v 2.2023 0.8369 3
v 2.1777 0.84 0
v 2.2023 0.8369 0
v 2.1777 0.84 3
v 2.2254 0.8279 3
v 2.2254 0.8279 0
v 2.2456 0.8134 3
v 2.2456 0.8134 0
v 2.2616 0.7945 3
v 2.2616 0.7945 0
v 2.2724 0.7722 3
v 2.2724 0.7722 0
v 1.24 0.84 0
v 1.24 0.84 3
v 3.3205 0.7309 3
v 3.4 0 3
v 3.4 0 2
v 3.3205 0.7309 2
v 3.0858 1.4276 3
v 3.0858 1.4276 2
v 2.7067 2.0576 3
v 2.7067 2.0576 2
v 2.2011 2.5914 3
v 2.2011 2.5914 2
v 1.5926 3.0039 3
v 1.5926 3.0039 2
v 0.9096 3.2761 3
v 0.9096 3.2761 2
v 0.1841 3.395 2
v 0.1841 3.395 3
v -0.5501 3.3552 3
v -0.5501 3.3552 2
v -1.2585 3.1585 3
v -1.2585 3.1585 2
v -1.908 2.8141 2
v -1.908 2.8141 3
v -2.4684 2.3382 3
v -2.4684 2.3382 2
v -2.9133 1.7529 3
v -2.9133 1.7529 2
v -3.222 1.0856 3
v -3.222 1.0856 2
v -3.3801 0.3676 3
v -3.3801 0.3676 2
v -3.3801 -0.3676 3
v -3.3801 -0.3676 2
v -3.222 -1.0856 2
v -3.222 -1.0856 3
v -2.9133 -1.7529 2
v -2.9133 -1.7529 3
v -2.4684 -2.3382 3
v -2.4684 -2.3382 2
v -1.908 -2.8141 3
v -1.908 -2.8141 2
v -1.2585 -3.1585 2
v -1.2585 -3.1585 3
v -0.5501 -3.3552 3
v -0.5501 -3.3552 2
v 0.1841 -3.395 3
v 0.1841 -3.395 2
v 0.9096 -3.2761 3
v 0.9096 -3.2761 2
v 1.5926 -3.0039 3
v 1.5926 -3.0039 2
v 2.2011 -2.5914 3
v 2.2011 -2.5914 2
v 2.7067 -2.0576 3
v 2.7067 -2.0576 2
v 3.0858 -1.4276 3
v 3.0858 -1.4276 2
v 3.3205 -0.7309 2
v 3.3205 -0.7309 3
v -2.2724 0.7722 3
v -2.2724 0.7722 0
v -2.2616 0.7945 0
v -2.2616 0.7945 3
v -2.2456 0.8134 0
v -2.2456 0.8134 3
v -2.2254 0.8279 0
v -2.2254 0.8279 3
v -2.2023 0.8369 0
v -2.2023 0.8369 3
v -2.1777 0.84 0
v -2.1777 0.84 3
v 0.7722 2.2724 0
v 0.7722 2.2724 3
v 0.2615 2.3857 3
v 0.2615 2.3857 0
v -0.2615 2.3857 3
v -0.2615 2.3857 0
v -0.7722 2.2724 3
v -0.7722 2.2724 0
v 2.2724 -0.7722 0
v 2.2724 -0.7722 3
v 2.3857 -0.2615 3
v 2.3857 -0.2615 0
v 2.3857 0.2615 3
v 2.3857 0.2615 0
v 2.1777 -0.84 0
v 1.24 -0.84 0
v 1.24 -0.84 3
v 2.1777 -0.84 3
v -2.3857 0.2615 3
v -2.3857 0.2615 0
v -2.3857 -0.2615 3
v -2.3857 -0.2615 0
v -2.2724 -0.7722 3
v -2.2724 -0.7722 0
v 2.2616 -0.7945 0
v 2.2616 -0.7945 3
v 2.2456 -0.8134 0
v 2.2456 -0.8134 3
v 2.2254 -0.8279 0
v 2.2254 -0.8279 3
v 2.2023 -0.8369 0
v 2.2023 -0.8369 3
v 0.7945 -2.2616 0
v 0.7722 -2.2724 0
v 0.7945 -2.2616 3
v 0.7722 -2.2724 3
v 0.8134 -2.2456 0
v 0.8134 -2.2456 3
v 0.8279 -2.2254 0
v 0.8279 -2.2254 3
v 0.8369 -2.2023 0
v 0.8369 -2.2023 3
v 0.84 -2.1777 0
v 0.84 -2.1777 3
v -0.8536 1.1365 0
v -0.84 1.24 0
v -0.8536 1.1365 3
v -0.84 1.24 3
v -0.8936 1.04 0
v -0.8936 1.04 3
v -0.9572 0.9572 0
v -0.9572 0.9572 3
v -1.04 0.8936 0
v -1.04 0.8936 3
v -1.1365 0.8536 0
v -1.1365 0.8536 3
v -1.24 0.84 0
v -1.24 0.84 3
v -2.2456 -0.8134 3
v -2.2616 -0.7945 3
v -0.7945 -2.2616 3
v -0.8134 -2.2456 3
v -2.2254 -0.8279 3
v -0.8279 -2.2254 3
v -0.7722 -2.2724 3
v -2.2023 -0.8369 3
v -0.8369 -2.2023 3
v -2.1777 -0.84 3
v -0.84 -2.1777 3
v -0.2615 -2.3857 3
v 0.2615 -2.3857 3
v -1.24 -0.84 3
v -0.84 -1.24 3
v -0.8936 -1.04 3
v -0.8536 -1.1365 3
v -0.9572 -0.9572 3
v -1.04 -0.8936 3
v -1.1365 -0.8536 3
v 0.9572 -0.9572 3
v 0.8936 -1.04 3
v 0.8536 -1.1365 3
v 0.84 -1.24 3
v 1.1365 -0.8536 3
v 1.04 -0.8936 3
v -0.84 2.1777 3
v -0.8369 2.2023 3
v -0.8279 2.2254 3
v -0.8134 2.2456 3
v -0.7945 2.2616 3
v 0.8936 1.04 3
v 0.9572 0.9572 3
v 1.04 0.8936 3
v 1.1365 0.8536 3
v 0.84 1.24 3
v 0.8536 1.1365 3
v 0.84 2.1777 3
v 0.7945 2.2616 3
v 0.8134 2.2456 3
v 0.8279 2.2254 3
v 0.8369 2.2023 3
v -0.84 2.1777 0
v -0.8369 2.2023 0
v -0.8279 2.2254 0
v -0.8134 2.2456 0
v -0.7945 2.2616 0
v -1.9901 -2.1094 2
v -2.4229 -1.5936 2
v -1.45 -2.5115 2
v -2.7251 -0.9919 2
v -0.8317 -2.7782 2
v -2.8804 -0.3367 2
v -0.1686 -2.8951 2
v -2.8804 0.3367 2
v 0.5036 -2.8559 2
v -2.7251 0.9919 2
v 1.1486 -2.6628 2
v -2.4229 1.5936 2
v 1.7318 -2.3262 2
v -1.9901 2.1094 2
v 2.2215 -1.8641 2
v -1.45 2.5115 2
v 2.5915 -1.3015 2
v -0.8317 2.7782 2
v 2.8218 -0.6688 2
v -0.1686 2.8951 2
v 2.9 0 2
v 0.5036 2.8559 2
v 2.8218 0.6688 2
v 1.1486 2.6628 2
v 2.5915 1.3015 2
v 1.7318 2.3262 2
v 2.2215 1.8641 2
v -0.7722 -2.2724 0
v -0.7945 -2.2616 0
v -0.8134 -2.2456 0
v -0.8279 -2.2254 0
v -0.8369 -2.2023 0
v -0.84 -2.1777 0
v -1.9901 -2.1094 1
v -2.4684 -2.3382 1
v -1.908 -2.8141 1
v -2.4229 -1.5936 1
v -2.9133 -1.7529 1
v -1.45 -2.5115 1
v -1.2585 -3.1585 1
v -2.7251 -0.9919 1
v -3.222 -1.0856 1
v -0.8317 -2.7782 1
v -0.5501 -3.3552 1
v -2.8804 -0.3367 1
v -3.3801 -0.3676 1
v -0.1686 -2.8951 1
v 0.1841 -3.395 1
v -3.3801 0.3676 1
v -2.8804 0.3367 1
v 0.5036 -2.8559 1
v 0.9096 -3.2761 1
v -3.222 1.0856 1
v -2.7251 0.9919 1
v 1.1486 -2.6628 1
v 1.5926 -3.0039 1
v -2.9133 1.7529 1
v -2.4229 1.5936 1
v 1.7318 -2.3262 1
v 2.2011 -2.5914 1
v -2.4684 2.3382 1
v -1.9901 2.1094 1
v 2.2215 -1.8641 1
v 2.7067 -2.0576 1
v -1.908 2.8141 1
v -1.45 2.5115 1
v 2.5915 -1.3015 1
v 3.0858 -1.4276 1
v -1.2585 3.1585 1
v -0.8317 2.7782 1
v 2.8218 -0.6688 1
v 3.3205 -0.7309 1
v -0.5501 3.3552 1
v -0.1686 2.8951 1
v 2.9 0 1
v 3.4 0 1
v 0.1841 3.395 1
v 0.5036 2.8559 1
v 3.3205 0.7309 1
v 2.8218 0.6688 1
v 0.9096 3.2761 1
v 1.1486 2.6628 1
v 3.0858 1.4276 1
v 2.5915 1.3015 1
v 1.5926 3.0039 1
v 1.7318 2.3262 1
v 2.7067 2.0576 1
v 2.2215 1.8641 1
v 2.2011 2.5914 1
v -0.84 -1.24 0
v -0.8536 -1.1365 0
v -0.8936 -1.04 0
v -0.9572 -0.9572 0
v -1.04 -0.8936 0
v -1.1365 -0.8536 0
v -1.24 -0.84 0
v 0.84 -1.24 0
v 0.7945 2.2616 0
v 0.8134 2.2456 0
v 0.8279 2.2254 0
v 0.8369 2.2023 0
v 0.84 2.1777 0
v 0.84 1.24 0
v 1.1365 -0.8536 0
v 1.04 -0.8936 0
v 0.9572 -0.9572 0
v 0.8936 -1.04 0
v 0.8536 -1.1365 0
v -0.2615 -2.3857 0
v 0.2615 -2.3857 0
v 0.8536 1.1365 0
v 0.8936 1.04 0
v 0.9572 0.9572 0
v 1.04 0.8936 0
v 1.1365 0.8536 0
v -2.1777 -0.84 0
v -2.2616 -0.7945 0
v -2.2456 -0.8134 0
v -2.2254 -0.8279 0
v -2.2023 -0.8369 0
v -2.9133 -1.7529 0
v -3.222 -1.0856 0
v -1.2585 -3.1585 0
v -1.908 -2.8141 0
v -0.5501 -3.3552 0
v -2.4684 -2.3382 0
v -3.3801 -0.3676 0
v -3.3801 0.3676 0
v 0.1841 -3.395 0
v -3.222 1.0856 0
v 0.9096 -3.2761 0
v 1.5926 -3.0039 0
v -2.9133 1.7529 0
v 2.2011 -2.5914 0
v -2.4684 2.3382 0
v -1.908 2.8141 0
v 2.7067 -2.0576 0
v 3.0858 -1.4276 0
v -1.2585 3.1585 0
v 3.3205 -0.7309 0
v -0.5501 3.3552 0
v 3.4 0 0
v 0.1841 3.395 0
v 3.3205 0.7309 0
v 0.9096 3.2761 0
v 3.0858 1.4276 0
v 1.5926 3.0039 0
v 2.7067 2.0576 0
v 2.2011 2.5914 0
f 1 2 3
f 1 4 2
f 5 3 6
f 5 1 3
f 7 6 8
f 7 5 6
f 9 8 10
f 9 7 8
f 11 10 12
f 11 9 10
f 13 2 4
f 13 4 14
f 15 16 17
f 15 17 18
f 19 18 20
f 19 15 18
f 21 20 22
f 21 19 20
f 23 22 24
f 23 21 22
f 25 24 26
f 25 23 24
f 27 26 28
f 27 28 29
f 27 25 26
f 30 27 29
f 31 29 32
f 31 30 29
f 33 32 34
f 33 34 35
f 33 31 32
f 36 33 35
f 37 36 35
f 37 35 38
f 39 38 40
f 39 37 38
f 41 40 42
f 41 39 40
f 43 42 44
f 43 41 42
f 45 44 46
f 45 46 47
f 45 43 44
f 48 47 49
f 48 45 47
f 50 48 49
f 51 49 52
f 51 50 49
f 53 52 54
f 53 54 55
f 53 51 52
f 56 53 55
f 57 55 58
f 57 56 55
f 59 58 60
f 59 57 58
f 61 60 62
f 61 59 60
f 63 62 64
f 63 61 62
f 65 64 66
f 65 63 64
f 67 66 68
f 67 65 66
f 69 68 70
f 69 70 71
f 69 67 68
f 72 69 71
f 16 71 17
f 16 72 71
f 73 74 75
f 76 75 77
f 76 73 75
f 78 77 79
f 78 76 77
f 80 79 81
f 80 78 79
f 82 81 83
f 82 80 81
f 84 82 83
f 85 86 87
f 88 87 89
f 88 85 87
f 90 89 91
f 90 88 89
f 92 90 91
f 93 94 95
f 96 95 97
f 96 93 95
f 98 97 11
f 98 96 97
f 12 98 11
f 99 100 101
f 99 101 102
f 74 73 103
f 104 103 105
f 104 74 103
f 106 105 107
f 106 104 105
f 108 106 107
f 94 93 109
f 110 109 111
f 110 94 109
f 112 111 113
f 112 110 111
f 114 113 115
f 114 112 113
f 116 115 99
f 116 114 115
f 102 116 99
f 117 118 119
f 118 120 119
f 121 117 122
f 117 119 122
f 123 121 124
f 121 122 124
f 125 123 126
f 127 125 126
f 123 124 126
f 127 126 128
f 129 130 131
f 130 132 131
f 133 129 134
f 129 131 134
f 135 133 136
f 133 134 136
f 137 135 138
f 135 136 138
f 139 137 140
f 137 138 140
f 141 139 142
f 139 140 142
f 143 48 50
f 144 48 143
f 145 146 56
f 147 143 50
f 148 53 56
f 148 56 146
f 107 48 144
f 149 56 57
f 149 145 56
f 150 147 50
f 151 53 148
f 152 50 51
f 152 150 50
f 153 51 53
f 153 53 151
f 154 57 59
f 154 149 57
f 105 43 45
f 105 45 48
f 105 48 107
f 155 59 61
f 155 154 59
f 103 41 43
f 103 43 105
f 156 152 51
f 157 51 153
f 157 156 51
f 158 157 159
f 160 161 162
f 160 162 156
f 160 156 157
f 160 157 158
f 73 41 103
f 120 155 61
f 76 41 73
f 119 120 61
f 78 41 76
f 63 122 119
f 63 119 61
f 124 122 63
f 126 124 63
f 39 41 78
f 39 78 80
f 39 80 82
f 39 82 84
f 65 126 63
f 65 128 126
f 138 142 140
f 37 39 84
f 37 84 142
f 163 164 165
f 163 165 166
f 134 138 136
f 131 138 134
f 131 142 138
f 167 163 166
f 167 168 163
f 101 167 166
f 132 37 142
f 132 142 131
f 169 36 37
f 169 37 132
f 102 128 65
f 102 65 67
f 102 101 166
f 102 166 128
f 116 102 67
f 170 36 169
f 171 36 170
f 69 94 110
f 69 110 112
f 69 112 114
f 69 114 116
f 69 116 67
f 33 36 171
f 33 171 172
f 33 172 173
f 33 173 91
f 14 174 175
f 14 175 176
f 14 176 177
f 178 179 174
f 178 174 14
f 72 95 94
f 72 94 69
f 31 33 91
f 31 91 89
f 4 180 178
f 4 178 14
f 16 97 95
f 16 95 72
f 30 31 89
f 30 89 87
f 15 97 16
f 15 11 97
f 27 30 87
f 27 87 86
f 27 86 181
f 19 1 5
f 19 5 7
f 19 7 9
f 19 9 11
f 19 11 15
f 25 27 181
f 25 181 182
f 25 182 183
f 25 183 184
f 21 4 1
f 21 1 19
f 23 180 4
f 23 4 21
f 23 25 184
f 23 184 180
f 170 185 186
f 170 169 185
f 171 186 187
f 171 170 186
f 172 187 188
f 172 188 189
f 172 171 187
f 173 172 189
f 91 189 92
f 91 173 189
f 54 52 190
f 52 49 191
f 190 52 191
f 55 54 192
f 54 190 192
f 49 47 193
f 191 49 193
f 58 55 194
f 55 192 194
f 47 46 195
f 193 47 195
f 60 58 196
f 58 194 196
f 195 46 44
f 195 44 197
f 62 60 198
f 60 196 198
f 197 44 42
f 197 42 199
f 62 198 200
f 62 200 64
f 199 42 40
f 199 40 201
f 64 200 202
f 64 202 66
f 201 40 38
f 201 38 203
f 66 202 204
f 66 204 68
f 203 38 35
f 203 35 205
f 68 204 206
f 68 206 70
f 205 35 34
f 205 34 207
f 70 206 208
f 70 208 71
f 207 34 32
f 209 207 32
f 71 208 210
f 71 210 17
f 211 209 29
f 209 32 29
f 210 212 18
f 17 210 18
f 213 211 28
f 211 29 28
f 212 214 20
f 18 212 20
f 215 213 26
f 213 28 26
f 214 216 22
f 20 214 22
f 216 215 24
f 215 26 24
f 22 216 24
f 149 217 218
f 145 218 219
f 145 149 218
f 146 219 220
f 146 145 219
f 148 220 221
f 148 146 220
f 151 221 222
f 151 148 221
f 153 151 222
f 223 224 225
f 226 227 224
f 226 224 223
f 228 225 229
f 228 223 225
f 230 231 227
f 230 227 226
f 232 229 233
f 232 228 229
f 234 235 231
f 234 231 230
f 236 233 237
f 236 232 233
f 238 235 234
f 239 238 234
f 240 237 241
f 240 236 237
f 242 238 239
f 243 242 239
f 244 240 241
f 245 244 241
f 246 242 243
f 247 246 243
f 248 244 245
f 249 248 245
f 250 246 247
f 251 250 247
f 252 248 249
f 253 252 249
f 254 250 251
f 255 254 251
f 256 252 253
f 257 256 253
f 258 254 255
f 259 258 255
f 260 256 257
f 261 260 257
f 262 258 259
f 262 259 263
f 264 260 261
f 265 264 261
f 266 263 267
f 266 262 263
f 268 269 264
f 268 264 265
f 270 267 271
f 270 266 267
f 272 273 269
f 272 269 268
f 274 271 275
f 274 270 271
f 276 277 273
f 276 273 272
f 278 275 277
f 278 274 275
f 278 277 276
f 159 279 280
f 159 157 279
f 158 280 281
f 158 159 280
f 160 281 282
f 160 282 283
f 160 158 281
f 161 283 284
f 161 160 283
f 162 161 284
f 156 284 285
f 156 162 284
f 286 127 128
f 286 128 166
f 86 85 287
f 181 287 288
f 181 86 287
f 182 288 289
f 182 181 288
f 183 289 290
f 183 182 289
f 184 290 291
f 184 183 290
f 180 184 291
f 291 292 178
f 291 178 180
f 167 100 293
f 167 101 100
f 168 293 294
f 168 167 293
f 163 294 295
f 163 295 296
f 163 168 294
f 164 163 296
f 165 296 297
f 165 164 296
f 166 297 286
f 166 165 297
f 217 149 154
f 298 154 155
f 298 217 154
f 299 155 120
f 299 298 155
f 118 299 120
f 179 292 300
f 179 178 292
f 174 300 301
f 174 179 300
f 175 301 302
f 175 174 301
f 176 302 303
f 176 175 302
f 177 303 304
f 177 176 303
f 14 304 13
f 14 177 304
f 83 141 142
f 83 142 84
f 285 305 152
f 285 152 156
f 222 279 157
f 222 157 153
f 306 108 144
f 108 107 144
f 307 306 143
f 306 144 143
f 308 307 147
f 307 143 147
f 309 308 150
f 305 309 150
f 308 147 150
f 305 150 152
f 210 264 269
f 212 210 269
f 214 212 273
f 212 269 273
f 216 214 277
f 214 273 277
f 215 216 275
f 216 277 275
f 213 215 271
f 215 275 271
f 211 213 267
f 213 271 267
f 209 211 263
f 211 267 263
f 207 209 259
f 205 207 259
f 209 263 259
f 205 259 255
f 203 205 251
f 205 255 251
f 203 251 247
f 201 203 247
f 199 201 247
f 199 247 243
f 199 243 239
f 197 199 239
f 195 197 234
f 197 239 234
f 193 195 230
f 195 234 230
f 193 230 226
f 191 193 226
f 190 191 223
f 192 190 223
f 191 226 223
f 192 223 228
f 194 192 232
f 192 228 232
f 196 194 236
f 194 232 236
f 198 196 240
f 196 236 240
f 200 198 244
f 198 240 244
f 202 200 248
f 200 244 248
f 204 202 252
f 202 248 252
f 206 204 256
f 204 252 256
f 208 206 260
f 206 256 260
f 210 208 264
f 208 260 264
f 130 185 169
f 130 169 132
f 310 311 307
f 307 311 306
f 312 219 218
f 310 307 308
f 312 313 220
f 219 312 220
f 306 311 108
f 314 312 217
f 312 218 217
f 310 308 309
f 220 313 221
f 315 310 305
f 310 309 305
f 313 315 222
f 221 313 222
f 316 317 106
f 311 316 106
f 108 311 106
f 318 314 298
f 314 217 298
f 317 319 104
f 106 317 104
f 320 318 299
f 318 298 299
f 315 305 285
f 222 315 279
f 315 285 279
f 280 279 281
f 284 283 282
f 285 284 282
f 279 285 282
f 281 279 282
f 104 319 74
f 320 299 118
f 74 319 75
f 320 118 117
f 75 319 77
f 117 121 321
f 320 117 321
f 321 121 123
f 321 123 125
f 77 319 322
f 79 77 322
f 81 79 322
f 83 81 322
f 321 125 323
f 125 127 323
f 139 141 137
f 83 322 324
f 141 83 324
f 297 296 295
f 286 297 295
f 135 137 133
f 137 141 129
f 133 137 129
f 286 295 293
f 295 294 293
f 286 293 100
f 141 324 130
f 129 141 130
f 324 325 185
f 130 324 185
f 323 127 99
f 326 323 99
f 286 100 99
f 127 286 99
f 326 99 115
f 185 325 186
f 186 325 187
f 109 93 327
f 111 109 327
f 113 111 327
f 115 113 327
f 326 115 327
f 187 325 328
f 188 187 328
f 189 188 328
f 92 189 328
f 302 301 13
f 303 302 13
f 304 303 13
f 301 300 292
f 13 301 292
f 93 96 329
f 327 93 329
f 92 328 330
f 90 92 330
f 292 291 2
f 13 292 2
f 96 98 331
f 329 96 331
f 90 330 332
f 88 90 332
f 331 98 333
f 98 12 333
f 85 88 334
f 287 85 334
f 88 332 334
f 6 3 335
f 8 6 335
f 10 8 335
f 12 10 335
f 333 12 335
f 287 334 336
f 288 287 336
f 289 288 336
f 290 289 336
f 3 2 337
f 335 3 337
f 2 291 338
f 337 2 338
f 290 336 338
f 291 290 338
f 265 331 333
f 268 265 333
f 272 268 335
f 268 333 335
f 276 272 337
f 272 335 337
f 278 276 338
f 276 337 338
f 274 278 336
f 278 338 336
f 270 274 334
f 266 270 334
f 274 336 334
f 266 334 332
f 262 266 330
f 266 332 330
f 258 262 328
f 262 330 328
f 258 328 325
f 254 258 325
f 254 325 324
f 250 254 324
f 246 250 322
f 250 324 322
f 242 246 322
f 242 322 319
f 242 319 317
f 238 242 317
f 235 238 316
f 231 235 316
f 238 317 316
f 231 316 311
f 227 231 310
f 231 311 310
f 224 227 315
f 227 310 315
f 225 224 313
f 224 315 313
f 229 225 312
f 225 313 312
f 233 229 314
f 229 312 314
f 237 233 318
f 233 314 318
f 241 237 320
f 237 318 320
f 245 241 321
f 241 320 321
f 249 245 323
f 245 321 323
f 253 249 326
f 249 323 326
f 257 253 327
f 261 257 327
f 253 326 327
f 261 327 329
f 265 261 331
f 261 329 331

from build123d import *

# Parameters (mm, degrees)
SKETCH1_R           = 3.4
BOSS_EXTRUDE1_DEPTH = 1
SKETCH2_R           = 2.9
BOSS_EXTRUDE2_DEPTH = 1
CUT_EXTRUDE1_DEPTH  = 6.667450926
FILLET1_R           = 0.4
FILLET2_R           = 0.4
FILLET3_R           = 0.4
FILLET4_R           = 0.4
FILLET5_R           = 0.1
FILLET6_R           = 0.1
FILLET7_R           = 0.1
FILLET8_R           = 0.1
FILLET9_R           = 0.1
FILLET10_R          = 0.1
FILLET11_R          = 0.1
FILLET12_R          = 0.1


with BuildPart() as part:
    # Sketch1 → Boss-Extrude1 (new body)
    with BuildSketch(Plane.XY):
        Circle(SKETCH1_R)
    boss_extrude1 = extrude(amount=BOSS_EXTRUDE1_DEPTH)

    # Sketch2 → Boss-Extrude2 (add)
    with BuildSketch(Plane.XY.offset(1)):
        Circle(SKETCH2_R)
    extrude(amount=BOSS_EXTRUDE2_DEPTH)

    # Mirror3: Boss-Extrude1 across plane
    add(boss_extrude1.mirror(Plane.XY.offset(1.5)))

    # Sketch3 → Cut-Extrude1 (cut, through all)
    with BuildSketch(Plane(origin=(0, 0, 0), x_dir=(-1, 0, 0), z_dir=(0, 0, -1))):
        with BuildLine():
            Line((0.84, -0.84), (0.84, -2.248199279))
            ThreePointArc((0.84, -2.248199279), (0, -2.4), (-0.84, -2.248199279))
            Line((-0.84, -2.248199279), (-0.84, -0.84))
            Line((-0.84, -0.84), (-2.248199279, -0.84))
            ThreePointArc((-2.248199279, -0.84), (-2.4, 0), (-2.248199279, 0.84))
            Line((-2.248199279, 0.84), (-0.84, 0.84))
            Line((-0.84, 0.84), (-0.84, 2.248199279))
            ThreePointArc((-0.84, 2.248199279), (0, 2.4), (0.84, 2.248199279))
            Line((0.84, 2.248199279), (0.84, 0.84))
            Line((0.84, 0.84), (2.248199279, 0.84))
            ThreePointArc((2.248199279, 0.84), (2.4, 0), (2.248199279, -0.84))
            Line((2.248199279, -0.84), (0.84, -0.84))
        make_face()
    extrude(amount=-CUT_EXTRUDE1_DEPTH, mode=Mode.SUBTRACT)

    # Fillet1
    fillet1_edges = [part.edges().sort_by_distance(p)[0] for p in [
        (-0.84, 0.84, 1.5),
    ]]
    fillet(fillet1_edges, radius=FILLET1_R)

    # Fillet2
    fillet2_edges = [part.edges().sort_by_distance(p)[0] for p in [
        (0.84, 0.84, 1.5),
    ]]
    fillet(fillet2_edges, radius=FILLET2_R)

    # Fillet3
    fillet3_edges = [part.edges().sort_by_distance(p)[0] for p in [
        (0.84, -0.84, 1.5),
    ]]
    fillet(fillet3_edges, radius=FILLET3_R)

    # Fillet4
    fillet4_edges = [part.edges().sort_by_distance(p)[0] for p in [
        (-0.84, -0.84, 1.5),
    ]]
    fillet(fillet4_edges, radius=FILLET4_R)

    # Fillet5
    fillet5_edges = [part.edges().sort_by_distance(p)[0] for p in [
        (0.84, -2.248199279, 1.5),
    ]]
    fillet(fillet5_edges, radius=FILLET5_R)

    # Fillet6
    fillet6_edges = [part.edges().sort_by_distance(p)[0] for p in [
        (-0.84, -2.248199279, 1.5),
    ]]
    fillet(fillet6_edges, radius=FILLET6_R)

    # Fillet7
    fillet7_edges = [part.edges().sort_by_distance(p)[0] for p in [
        (-2.248199279, 0.84, 1.5),
    ]]
    fillet(fillet7_edges, radius=FILLET7_R)

    # Fillet8
    fillet8_edges = [part.edges().sort_by_distance(p)[0] for p in [
        (-2.248199279, -0.84, 1.5),
    ]]
    fillet(fillet8_edges, radius=FILLET8_R)

    # Fillet9
    fillet9_edges = [part.edges().sort_by_distance(p)[0] for p in [
        (-0.84, 2.248199279, 1.5),
    ]]
    fillet(fillet9_edges, radius=FILLET9_R)

    # Fillet10
    fillet10_edges = [part.edges().sort_by_distance(p)[0] for p in [
        (0.84, 2.248199279, 1.5),
    ]]
    fillet(fillet10_edges, radius=FILLET10_R)

    # Fillet11
    fillet11_edges = [part.edges().sort_by_distance(p)[0] for p in [
        (2.248199279, 0.84, 1.5),
    ]]
    fillet(fillet11_edges, radius=FILLET11_R)

    # Fillet12
    fillet12_edges = [part.edges().sort_by_distance(p)[0] for p in [
        (2.248199279, -0.84, 1.5),
    ]]
    fillet(fillet12_edges, radius=FILLET12_R)


solid = part.part
